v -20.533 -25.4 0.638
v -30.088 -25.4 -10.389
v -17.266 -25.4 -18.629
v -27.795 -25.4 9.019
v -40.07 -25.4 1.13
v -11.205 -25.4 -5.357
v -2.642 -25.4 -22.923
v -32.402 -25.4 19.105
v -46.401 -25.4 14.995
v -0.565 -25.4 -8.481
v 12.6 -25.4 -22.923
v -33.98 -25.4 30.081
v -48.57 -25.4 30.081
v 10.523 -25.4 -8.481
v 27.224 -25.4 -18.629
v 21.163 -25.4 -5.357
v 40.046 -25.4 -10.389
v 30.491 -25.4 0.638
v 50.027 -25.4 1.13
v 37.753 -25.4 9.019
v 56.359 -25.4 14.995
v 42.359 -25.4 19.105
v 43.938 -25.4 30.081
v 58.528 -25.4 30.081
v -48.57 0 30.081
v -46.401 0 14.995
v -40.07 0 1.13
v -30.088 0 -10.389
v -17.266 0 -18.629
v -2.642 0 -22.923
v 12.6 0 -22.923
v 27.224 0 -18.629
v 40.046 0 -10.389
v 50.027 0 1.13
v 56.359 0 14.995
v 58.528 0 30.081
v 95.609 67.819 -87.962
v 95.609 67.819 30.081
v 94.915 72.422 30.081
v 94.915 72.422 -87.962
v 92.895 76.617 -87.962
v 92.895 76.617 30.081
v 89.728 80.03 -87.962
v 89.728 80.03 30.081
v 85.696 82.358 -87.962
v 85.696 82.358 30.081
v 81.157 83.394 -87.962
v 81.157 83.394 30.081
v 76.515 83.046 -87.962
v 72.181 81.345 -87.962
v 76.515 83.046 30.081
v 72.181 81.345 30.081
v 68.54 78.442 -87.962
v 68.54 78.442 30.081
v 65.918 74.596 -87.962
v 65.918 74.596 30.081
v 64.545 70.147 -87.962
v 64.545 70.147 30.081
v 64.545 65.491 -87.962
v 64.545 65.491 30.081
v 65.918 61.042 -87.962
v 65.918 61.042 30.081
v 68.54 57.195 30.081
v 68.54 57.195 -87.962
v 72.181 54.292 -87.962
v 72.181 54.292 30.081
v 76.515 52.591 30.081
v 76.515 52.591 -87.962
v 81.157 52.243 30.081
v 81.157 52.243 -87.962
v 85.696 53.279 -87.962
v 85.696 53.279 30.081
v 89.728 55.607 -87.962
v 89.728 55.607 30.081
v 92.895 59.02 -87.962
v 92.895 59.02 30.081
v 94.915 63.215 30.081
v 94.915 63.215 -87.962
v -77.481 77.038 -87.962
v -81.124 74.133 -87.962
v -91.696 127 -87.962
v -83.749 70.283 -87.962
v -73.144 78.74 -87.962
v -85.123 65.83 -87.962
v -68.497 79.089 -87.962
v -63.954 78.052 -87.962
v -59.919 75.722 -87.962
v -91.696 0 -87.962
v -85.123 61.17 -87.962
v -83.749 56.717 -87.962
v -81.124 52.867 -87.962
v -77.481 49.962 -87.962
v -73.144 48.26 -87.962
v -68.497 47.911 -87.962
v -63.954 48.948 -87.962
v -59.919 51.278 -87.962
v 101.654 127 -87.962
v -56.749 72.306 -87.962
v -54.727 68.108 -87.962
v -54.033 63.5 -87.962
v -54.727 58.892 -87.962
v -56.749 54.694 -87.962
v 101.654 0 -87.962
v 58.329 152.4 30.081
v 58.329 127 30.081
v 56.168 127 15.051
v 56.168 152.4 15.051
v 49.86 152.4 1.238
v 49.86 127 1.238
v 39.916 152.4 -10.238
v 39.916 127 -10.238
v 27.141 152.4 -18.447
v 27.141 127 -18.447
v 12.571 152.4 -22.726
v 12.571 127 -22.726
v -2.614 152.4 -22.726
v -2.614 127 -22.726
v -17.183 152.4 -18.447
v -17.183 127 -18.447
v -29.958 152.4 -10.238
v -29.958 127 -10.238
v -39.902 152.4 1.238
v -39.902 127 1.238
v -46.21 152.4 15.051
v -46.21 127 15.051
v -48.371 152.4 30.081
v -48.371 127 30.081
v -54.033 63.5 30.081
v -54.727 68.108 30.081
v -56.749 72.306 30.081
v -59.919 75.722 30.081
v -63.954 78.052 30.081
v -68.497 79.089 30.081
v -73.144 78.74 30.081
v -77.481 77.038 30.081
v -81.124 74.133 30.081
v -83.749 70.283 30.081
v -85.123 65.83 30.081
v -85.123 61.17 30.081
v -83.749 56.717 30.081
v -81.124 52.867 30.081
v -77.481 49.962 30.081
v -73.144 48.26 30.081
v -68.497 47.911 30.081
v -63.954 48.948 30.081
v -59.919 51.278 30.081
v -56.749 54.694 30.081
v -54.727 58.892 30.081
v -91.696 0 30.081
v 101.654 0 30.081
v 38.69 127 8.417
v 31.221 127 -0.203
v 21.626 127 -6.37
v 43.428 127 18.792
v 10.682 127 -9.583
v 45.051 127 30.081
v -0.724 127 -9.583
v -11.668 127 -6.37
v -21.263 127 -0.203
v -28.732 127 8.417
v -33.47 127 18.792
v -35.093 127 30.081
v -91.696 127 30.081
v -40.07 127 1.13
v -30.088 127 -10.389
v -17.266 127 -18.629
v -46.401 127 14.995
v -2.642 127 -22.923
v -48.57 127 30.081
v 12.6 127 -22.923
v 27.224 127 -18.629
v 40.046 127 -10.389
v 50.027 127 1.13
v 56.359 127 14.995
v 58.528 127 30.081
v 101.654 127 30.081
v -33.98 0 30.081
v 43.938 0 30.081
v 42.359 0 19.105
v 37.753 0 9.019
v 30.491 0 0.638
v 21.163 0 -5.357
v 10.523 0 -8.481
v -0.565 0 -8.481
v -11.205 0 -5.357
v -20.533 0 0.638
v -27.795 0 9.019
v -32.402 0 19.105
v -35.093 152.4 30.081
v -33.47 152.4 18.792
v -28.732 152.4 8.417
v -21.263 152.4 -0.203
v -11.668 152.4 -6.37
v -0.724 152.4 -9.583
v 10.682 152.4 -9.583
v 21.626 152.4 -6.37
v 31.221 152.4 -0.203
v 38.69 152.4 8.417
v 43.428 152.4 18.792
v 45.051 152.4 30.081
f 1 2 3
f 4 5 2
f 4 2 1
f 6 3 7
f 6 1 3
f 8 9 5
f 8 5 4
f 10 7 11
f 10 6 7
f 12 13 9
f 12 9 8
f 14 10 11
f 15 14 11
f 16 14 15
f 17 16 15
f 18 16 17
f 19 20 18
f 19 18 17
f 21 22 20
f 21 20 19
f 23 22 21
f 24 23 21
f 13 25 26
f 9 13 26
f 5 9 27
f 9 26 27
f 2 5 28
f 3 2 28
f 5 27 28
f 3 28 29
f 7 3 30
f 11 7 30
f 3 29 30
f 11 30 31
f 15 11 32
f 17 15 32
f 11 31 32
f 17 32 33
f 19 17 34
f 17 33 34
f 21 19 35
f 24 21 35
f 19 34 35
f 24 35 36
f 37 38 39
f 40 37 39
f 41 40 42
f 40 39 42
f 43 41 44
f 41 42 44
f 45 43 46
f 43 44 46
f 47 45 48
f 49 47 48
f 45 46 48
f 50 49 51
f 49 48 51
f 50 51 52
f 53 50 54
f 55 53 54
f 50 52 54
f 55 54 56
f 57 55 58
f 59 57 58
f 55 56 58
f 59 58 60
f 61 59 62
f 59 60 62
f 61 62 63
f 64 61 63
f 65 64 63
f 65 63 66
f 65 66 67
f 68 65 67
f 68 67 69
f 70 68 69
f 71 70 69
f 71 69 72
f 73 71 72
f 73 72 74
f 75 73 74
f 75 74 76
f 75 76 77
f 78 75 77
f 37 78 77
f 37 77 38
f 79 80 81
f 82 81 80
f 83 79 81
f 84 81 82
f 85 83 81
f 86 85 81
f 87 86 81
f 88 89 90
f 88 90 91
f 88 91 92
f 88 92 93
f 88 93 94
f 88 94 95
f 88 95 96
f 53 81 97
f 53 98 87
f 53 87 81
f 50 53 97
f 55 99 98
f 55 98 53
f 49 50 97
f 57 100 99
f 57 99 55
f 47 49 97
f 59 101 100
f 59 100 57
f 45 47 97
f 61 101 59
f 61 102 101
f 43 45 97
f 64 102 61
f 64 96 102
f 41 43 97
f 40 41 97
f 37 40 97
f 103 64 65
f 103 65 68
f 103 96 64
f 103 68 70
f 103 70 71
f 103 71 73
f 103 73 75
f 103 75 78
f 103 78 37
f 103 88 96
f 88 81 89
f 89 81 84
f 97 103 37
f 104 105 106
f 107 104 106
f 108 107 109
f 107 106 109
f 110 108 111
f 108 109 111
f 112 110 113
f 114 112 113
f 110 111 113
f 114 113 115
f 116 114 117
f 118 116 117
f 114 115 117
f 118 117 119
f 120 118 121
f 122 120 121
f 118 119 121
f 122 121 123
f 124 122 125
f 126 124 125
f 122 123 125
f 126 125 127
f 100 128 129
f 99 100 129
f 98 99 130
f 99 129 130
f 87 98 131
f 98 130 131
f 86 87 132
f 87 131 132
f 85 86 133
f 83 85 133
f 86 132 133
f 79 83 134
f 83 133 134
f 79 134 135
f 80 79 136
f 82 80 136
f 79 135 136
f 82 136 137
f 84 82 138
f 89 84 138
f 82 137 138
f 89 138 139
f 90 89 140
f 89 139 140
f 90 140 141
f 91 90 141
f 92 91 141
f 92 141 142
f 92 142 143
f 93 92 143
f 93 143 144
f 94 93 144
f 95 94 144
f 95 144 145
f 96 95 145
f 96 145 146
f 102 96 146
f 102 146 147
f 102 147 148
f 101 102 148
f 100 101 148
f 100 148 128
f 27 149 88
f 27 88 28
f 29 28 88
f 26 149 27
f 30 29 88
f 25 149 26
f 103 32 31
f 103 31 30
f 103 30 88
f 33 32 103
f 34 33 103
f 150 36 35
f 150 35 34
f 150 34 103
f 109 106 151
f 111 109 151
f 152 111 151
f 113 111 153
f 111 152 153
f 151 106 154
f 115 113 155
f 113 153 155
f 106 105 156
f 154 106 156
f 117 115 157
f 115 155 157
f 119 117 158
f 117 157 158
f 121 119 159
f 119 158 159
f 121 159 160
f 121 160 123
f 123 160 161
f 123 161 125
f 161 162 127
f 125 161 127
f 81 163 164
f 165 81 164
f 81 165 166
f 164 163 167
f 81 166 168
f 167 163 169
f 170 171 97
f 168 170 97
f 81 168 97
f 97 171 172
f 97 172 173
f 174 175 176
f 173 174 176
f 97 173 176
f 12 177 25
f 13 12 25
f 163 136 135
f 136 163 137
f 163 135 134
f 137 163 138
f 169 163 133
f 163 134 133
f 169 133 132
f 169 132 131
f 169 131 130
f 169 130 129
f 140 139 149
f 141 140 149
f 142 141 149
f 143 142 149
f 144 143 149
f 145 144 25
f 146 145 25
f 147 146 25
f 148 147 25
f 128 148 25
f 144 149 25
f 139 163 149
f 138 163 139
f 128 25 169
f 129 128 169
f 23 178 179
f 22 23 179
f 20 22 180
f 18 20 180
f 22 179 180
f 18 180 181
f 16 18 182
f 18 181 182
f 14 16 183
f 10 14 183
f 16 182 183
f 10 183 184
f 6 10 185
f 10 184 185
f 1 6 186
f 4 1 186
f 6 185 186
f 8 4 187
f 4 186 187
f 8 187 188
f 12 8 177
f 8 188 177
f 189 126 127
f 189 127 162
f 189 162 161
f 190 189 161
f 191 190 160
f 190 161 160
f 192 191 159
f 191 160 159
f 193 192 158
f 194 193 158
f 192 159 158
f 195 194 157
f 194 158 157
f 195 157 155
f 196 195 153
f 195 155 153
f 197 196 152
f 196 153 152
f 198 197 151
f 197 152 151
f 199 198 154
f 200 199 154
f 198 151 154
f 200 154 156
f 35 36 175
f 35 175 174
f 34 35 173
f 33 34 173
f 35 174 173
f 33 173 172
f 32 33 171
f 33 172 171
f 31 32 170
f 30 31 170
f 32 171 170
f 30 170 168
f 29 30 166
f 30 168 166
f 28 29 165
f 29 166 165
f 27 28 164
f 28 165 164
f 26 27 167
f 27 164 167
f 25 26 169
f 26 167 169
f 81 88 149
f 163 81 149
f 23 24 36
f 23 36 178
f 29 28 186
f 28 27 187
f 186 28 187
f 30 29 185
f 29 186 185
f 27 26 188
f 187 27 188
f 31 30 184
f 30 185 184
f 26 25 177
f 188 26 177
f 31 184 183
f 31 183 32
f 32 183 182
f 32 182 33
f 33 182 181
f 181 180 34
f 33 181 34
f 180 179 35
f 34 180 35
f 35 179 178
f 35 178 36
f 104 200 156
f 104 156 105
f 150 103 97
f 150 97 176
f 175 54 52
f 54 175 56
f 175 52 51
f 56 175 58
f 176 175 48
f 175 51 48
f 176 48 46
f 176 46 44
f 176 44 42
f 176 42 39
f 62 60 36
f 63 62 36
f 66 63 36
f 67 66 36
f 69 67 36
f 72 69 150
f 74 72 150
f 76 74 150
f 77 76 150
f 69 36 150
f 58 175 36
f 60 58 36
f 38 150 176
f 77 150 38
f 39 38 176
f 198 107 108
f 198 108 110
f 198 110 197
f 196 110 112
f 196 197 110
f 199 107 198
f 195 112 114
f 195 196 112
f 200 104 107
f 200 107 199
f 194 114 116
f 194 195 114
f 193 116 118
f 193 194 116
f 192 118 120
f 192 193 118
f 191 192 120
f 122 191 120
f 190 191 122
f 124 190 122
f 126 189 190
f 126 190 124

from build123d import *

# Parameters (mm, degrees)
F0_W     = 193.350047
F0_H     = 118.043102
F1_DEPTH = 127
F3_DEPTH = 127
F5_DEPTH = 25.4
F7_DEPTH = 25.4
F8_R     = 15.632248
F8_R_2   = 15.619169
F9_DEPTH = 254


with BuildPart() as f1:
    # F0 (on Front) → F1 (new body)
    with BuildSketch(Plane.XZ):
        with Locations((4.978939, -28.940257)):
            Rectangle(F0_W, F0_H)
    extrude(amount=-F1_DEPTH)

    # F2 (on face) → F3 (cut)
    with BuildSketch(Plane(origin=(0, 127, 0), x_dir=(-1, 0, 0), z_dir=(0, 1, 0))):
        with BuildLine():
            Line((48.570371, 30.081294), (-58.52825, 30.081294))
            ThreePointArc((-58.52825, 30.081294), (-4.97894, -23.468016), (48.570371, 30.081294))
        make_face()
    extrude(amount=-F3_DEPTH, mode=Mode.SUBTRACT)

    # F8 (on face) → F9 (cut)
    with BuildSketch(Plane.XY.offset(30.081294)):
        with Locations((-69.665216, 63.5)):
            Circle(F8_R)
        with Locations((79.990104, 67.818604)):
            Circle(F8_R_2)
    extrude(amount=-F9_DEPTH, mode=Mode.SUBTRACT)


with BuildPart() as f5:
    # F4 (on face) → F5 (new body)
    with BuildSketch(Plane(origin=(0, 127, 0), x_dir=(-1, 0, 0), z_dir=(0, 1, 0))):
        with BuildLine():
            Line((-45.051298, 30.081294), (-58.328841, 30.081294))
            ThreePointArc((-58.328841, 30.081294), (-4.97894, -23.268607), (48.370961, 30.081294))
            Line((48.370961, 30.081294), (35.093418, 30.081294))
            ThreePointArc((35.093418, 30.081294), (-4.97894, -9.991064), (-45.051298, 30.081294))
        make_face()
    extrude(amount=F5_DEPTH)


with BuildPart() as f7:
    # F6 (on face) → F7 (new body)
    with BuildSketch(Plane.XZ):
        with BuildLine():
            ThreePointArc((43.937512, 30.081294), (4.97894, -8.877278), (-33.979632, 30.081294))
            Line((-33.979632, 30.081294), (-48.570371, 30.081294))
            ThreePointArc((-48.570371, 30.081294), (4.97894, -23.468016), (58.52825, 30.081294))
            Line((58.52825, 30.081294), (43.937512, 30.081294))
        make_face()
    extrude(amount=F7_DEPTH)


solid = Compound([f1.part, f5.part, f7.part])
